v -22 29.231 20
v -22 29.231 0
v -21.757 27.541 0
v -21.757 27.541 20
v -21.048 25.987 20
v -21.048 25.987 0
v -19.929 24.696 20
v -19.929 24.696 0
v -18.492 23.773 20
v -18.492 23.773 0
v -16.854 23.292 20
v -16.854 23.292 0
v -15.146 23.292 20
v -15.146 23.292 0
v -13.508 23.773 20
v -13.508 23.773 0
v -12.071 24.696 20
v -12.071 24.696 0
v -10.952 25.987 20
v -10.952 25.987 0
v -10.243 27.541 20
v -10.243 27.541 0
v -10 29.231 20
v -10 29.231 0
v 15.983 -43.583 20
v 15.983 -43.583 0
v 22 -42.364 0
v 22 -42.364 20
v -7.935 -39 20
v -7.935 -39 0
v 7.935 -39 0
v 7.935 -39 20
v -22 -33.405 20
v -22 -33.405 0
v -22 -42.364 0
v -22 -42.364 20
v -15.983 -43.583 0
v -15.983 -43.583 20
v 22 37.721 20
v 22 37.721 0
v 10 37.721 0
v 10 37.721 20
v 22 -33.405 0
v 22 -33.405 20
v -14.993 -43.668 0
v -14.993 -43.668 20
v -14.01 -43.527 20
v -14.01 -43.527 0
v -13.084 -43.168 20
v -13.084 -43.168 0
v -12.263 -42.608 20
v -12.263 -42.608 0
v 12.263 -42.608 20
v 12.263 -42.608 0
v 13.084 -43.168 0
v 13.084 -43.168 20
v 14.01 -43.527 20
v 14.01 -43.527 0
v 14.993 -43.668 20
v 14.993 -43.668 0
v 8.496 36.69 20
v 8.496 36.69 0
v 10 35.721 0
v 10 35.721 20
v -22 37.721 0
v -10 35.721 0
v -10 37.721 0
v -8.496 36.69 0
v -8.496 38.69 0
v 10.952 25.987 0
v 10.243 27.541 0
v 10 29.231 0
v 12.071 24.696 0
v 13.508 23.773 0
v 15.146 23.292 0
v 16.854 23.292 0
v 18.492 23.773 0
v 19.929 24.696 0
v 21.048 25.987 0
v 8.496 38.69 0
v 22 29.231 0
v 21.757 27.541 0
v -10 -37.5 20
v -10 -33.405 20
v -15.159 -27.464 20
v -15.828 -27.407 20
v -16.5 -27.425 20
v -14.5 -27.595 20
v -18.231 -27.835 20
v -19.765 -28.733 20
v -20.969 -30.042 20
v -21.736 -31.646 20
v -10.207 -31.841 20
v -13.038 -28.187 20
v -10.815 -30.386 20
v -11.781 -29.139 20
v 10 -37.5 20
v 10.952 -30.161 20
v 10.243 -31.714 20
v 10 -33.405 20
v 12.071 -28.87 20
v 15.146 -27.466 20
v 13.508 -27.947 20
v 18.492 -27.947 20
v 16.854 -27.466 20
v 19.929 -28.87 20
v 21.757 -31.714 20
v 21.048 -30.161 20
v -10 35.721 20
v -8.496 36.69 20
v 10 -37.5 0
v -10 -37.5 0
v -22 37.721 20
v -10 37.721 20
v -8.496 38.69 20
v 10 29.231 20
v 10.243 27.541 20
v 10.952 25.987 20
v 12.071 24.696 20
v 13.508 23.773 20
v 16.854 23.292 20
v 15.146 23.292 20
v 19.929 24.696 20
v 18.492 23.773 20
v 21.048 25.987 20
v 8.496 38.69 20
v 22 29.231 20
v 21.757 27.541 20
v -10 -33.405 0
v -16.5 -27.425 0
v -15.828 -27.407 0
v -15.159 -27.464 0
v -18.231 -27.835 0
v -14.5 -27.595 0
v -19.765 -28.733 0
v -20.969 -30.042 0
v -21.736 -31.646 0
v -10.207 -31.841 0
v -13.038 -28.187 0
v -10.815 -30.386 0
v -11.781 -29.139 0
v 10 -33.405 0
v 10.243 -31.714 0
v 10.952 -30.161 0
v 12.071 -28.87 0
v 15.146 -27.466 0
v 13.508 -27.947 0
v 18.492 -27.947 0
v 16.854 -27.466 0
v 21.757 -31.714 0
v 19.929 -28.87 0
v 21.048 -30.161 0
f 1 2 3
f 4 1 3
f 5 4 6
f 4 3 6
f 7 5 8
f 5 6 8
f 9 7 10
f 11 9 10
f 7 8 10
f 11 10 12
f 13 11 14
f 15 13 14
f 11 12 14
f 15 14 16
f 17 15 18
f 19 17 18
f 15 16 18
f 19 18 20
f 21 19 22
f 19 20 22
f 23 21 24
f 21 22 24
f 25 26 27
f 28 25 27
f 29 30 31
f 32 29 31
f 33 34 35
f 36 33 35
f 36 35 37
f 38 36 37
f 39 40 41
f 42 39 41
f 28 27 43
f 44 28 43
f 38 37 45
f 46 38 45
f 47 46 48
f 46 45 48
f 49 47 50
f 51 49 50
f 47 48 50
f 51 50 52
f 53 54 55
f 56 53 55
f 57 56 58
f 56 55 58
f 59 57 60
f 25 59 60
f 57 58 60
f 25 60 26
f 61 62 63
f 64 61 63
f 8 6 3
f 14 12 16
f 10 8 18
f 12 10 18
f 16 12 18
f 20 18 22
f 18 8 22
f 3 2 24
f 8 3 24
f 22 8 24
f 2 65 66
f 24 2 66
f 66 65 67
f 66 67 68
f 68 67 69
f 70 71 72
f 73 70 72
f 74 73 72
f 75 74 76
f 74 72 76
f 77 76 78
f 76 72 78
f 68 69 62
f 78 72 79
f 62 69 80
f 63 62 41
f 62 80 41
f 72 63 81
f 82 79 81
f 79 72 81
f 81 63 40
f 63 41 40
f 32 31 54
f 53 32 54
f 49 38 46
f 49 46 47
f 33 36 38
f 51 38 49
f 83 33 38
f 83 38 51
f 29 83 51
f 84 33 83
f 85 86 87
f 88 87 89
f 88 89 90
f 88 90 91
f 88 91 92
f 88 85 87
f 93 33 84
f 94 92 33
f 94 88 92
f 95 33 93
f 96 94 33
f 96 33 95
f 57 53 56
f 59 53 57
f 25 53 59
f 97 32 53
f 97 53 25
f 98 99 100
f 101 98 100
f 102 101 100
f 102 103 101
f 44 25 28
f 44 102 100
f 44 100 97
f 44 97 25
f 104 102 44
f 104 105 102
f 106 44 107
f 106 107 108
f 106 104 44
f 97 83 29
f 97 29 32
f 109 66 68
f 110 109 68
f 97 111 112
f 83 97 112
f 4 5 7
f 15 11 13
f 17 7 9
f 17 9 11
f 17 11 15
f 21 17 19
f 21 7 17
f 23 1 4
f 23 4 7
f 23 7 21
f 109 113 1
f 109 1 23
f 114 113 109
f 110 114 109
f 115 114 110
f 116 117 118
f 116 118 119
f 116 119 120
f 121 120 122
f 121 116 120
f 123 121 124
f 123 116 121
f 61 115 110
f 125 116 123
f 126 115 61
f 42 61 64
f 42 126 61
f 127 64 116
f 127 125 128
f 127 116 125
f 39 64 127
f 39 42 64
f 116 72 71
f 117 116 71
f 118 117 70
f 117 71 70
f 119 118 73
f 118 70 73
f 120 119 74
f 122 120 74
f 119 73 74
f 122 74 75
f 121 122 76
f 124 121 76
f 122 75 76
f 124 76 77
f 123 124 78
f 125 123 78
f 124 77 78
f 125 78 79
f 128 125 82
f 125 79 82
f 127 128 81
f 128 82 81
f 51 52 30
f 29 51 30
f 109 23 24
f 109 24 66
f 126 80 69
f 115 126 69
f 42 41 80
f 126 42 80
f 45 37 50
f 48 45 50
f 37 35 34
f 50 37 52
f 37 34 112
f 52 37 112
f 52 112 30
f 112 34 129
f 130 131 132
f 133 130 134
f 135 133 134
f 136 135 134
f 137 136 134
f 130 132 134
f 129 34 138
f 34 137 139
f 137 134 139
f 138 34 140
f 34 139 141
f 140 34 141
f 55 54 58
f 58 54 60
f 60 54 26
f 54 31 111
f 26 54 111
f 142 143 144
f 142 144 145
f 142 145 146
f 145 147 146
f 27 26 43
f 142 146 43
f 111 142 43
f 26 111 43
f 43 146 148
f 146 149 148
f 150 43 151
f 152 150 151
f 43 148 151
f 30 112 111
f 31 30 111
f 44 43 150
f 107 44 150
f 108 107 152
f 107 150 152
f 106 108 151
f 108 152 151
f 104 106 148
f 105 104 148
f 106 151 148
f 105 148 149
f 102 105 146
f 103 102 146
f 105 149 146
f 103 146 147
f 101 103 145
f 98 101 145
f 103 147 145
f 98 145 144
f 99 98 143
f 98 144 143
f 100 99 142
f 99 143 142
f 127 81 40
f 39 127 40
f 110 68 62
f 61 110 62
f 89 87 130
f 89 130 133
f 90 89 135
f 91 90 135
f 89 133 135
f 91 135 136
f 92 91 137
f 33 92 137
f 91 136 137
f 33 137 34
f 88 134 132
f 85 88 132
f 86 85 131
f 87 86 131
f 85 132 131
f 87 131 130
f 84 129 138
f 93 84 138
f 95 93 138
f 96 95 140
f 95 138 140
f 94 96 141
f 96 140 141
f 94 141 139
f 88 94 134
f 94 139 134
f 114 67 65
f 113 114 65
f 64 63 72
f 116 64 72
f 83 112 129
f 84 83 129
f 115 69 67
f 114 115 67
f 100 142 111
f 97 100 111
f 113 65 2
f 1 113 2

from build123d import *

# Parameters (mm, degrees)
F1_DEPTH = 20


with BuildPart() as f1:
    # F0 (on Top) → F1 (new body)
    with BuildSketch(Plane.XY):
        with BuildLine():
            Line((22, -39), (7.9348, -39))
            Line((7.9348, -39), (12.263496, -42.60762))
            ThreePointArc((12.263496, -42.60762), (14.009721, -43.527265), (15.982518, -43.583099))
            Line((15.982518, -43.583099), (22, -42.363748))
            Line((22, -42.363748), (22, -39))
        make_face()
        with BuildLine():
            Line((-22, -33.404537), (-22, -39))
            Line((-22, -39), (-7.9348, -39))
            Line((-7.9348, -39), (0, -39))
            Line((0, -39), (7.9348, -39))
            Line((7.9348, -39), (22, -39))
            Line((22, -39), (22, -33.404537))
            ThreePointArc((22, -33.404537), (16, -27.404537), (10, -33.404537))
            Line((10, -33.404537), (10, -37.5))
            Line((10, -37.5), (0, -37.5))
            Line((0, -37.5), (-10, -37.5))
            Line((-10, -37.5), (-10, -33.404537))
            ThreePointArc((-10, -33.404537), (-11.256584, -29.730302), (-14.5, -27.595062))
            ThreePointArc((-14.5, -27.595062), (-15.492855, -27.426008), (-16.5, -27.425406))
            ThreePointArc((-16.5, -27.425406), (-20.41588, -29.342517), (-22, -33.404537))
        make_face()
        with BuildLine():
            Line((-7.9348, -39), (-22, -39))
            Line((-22, -39), (-22, -42.363748))
            Line((-22, -42.363748), (-15.982518, -43.583099))
            ThreePointArc((-15.982518, -43.583099), (-14.009721, -43.527265), (-12.263496, -42.60762))
            Line((-12.263496, -42.60762), (-7.9348, -39))
        make_face()
        with BuildLine():
            Line((-22, 37.720796), (-22, 29.230934))
            ThreePointArc((-22, 29.230934), (-16, 23.230934), (-10, 29.230934))
            Line((-10, 29.230934), (-10, 35.720796))
            Line((-10, 35.720796), (-8.496368, 36.690091))
            Line((-8.496368, 36.690091), (8.496368, 36.690091))
            Line((8.496368, 36.690091), (10, 35.720796))
            Line((10, 35.720796), (10, 29.230934))
            ThreePointArc((10, 29.230934), (16, 23.230934), (22, 29.230934))
            Line((22, 29.230934), (22, 37.720796))
            Line((22, 37.720796), (10, 37.720796))
            Line((10, 37.720796), (8.496368, 38.690091))
            Line((8.496368, 38.690091), (0, 38.690091))
            Line((0, 38.690091), (-8.496368, 38.690091))
            Line((-8.496368, 38.690091), (-10, 37.720796))
            Line((-10, 37.720796), (-22, 37.720796))
        make_face()
    extrude(amount=F1_DEPTH)


solid = f1.part
